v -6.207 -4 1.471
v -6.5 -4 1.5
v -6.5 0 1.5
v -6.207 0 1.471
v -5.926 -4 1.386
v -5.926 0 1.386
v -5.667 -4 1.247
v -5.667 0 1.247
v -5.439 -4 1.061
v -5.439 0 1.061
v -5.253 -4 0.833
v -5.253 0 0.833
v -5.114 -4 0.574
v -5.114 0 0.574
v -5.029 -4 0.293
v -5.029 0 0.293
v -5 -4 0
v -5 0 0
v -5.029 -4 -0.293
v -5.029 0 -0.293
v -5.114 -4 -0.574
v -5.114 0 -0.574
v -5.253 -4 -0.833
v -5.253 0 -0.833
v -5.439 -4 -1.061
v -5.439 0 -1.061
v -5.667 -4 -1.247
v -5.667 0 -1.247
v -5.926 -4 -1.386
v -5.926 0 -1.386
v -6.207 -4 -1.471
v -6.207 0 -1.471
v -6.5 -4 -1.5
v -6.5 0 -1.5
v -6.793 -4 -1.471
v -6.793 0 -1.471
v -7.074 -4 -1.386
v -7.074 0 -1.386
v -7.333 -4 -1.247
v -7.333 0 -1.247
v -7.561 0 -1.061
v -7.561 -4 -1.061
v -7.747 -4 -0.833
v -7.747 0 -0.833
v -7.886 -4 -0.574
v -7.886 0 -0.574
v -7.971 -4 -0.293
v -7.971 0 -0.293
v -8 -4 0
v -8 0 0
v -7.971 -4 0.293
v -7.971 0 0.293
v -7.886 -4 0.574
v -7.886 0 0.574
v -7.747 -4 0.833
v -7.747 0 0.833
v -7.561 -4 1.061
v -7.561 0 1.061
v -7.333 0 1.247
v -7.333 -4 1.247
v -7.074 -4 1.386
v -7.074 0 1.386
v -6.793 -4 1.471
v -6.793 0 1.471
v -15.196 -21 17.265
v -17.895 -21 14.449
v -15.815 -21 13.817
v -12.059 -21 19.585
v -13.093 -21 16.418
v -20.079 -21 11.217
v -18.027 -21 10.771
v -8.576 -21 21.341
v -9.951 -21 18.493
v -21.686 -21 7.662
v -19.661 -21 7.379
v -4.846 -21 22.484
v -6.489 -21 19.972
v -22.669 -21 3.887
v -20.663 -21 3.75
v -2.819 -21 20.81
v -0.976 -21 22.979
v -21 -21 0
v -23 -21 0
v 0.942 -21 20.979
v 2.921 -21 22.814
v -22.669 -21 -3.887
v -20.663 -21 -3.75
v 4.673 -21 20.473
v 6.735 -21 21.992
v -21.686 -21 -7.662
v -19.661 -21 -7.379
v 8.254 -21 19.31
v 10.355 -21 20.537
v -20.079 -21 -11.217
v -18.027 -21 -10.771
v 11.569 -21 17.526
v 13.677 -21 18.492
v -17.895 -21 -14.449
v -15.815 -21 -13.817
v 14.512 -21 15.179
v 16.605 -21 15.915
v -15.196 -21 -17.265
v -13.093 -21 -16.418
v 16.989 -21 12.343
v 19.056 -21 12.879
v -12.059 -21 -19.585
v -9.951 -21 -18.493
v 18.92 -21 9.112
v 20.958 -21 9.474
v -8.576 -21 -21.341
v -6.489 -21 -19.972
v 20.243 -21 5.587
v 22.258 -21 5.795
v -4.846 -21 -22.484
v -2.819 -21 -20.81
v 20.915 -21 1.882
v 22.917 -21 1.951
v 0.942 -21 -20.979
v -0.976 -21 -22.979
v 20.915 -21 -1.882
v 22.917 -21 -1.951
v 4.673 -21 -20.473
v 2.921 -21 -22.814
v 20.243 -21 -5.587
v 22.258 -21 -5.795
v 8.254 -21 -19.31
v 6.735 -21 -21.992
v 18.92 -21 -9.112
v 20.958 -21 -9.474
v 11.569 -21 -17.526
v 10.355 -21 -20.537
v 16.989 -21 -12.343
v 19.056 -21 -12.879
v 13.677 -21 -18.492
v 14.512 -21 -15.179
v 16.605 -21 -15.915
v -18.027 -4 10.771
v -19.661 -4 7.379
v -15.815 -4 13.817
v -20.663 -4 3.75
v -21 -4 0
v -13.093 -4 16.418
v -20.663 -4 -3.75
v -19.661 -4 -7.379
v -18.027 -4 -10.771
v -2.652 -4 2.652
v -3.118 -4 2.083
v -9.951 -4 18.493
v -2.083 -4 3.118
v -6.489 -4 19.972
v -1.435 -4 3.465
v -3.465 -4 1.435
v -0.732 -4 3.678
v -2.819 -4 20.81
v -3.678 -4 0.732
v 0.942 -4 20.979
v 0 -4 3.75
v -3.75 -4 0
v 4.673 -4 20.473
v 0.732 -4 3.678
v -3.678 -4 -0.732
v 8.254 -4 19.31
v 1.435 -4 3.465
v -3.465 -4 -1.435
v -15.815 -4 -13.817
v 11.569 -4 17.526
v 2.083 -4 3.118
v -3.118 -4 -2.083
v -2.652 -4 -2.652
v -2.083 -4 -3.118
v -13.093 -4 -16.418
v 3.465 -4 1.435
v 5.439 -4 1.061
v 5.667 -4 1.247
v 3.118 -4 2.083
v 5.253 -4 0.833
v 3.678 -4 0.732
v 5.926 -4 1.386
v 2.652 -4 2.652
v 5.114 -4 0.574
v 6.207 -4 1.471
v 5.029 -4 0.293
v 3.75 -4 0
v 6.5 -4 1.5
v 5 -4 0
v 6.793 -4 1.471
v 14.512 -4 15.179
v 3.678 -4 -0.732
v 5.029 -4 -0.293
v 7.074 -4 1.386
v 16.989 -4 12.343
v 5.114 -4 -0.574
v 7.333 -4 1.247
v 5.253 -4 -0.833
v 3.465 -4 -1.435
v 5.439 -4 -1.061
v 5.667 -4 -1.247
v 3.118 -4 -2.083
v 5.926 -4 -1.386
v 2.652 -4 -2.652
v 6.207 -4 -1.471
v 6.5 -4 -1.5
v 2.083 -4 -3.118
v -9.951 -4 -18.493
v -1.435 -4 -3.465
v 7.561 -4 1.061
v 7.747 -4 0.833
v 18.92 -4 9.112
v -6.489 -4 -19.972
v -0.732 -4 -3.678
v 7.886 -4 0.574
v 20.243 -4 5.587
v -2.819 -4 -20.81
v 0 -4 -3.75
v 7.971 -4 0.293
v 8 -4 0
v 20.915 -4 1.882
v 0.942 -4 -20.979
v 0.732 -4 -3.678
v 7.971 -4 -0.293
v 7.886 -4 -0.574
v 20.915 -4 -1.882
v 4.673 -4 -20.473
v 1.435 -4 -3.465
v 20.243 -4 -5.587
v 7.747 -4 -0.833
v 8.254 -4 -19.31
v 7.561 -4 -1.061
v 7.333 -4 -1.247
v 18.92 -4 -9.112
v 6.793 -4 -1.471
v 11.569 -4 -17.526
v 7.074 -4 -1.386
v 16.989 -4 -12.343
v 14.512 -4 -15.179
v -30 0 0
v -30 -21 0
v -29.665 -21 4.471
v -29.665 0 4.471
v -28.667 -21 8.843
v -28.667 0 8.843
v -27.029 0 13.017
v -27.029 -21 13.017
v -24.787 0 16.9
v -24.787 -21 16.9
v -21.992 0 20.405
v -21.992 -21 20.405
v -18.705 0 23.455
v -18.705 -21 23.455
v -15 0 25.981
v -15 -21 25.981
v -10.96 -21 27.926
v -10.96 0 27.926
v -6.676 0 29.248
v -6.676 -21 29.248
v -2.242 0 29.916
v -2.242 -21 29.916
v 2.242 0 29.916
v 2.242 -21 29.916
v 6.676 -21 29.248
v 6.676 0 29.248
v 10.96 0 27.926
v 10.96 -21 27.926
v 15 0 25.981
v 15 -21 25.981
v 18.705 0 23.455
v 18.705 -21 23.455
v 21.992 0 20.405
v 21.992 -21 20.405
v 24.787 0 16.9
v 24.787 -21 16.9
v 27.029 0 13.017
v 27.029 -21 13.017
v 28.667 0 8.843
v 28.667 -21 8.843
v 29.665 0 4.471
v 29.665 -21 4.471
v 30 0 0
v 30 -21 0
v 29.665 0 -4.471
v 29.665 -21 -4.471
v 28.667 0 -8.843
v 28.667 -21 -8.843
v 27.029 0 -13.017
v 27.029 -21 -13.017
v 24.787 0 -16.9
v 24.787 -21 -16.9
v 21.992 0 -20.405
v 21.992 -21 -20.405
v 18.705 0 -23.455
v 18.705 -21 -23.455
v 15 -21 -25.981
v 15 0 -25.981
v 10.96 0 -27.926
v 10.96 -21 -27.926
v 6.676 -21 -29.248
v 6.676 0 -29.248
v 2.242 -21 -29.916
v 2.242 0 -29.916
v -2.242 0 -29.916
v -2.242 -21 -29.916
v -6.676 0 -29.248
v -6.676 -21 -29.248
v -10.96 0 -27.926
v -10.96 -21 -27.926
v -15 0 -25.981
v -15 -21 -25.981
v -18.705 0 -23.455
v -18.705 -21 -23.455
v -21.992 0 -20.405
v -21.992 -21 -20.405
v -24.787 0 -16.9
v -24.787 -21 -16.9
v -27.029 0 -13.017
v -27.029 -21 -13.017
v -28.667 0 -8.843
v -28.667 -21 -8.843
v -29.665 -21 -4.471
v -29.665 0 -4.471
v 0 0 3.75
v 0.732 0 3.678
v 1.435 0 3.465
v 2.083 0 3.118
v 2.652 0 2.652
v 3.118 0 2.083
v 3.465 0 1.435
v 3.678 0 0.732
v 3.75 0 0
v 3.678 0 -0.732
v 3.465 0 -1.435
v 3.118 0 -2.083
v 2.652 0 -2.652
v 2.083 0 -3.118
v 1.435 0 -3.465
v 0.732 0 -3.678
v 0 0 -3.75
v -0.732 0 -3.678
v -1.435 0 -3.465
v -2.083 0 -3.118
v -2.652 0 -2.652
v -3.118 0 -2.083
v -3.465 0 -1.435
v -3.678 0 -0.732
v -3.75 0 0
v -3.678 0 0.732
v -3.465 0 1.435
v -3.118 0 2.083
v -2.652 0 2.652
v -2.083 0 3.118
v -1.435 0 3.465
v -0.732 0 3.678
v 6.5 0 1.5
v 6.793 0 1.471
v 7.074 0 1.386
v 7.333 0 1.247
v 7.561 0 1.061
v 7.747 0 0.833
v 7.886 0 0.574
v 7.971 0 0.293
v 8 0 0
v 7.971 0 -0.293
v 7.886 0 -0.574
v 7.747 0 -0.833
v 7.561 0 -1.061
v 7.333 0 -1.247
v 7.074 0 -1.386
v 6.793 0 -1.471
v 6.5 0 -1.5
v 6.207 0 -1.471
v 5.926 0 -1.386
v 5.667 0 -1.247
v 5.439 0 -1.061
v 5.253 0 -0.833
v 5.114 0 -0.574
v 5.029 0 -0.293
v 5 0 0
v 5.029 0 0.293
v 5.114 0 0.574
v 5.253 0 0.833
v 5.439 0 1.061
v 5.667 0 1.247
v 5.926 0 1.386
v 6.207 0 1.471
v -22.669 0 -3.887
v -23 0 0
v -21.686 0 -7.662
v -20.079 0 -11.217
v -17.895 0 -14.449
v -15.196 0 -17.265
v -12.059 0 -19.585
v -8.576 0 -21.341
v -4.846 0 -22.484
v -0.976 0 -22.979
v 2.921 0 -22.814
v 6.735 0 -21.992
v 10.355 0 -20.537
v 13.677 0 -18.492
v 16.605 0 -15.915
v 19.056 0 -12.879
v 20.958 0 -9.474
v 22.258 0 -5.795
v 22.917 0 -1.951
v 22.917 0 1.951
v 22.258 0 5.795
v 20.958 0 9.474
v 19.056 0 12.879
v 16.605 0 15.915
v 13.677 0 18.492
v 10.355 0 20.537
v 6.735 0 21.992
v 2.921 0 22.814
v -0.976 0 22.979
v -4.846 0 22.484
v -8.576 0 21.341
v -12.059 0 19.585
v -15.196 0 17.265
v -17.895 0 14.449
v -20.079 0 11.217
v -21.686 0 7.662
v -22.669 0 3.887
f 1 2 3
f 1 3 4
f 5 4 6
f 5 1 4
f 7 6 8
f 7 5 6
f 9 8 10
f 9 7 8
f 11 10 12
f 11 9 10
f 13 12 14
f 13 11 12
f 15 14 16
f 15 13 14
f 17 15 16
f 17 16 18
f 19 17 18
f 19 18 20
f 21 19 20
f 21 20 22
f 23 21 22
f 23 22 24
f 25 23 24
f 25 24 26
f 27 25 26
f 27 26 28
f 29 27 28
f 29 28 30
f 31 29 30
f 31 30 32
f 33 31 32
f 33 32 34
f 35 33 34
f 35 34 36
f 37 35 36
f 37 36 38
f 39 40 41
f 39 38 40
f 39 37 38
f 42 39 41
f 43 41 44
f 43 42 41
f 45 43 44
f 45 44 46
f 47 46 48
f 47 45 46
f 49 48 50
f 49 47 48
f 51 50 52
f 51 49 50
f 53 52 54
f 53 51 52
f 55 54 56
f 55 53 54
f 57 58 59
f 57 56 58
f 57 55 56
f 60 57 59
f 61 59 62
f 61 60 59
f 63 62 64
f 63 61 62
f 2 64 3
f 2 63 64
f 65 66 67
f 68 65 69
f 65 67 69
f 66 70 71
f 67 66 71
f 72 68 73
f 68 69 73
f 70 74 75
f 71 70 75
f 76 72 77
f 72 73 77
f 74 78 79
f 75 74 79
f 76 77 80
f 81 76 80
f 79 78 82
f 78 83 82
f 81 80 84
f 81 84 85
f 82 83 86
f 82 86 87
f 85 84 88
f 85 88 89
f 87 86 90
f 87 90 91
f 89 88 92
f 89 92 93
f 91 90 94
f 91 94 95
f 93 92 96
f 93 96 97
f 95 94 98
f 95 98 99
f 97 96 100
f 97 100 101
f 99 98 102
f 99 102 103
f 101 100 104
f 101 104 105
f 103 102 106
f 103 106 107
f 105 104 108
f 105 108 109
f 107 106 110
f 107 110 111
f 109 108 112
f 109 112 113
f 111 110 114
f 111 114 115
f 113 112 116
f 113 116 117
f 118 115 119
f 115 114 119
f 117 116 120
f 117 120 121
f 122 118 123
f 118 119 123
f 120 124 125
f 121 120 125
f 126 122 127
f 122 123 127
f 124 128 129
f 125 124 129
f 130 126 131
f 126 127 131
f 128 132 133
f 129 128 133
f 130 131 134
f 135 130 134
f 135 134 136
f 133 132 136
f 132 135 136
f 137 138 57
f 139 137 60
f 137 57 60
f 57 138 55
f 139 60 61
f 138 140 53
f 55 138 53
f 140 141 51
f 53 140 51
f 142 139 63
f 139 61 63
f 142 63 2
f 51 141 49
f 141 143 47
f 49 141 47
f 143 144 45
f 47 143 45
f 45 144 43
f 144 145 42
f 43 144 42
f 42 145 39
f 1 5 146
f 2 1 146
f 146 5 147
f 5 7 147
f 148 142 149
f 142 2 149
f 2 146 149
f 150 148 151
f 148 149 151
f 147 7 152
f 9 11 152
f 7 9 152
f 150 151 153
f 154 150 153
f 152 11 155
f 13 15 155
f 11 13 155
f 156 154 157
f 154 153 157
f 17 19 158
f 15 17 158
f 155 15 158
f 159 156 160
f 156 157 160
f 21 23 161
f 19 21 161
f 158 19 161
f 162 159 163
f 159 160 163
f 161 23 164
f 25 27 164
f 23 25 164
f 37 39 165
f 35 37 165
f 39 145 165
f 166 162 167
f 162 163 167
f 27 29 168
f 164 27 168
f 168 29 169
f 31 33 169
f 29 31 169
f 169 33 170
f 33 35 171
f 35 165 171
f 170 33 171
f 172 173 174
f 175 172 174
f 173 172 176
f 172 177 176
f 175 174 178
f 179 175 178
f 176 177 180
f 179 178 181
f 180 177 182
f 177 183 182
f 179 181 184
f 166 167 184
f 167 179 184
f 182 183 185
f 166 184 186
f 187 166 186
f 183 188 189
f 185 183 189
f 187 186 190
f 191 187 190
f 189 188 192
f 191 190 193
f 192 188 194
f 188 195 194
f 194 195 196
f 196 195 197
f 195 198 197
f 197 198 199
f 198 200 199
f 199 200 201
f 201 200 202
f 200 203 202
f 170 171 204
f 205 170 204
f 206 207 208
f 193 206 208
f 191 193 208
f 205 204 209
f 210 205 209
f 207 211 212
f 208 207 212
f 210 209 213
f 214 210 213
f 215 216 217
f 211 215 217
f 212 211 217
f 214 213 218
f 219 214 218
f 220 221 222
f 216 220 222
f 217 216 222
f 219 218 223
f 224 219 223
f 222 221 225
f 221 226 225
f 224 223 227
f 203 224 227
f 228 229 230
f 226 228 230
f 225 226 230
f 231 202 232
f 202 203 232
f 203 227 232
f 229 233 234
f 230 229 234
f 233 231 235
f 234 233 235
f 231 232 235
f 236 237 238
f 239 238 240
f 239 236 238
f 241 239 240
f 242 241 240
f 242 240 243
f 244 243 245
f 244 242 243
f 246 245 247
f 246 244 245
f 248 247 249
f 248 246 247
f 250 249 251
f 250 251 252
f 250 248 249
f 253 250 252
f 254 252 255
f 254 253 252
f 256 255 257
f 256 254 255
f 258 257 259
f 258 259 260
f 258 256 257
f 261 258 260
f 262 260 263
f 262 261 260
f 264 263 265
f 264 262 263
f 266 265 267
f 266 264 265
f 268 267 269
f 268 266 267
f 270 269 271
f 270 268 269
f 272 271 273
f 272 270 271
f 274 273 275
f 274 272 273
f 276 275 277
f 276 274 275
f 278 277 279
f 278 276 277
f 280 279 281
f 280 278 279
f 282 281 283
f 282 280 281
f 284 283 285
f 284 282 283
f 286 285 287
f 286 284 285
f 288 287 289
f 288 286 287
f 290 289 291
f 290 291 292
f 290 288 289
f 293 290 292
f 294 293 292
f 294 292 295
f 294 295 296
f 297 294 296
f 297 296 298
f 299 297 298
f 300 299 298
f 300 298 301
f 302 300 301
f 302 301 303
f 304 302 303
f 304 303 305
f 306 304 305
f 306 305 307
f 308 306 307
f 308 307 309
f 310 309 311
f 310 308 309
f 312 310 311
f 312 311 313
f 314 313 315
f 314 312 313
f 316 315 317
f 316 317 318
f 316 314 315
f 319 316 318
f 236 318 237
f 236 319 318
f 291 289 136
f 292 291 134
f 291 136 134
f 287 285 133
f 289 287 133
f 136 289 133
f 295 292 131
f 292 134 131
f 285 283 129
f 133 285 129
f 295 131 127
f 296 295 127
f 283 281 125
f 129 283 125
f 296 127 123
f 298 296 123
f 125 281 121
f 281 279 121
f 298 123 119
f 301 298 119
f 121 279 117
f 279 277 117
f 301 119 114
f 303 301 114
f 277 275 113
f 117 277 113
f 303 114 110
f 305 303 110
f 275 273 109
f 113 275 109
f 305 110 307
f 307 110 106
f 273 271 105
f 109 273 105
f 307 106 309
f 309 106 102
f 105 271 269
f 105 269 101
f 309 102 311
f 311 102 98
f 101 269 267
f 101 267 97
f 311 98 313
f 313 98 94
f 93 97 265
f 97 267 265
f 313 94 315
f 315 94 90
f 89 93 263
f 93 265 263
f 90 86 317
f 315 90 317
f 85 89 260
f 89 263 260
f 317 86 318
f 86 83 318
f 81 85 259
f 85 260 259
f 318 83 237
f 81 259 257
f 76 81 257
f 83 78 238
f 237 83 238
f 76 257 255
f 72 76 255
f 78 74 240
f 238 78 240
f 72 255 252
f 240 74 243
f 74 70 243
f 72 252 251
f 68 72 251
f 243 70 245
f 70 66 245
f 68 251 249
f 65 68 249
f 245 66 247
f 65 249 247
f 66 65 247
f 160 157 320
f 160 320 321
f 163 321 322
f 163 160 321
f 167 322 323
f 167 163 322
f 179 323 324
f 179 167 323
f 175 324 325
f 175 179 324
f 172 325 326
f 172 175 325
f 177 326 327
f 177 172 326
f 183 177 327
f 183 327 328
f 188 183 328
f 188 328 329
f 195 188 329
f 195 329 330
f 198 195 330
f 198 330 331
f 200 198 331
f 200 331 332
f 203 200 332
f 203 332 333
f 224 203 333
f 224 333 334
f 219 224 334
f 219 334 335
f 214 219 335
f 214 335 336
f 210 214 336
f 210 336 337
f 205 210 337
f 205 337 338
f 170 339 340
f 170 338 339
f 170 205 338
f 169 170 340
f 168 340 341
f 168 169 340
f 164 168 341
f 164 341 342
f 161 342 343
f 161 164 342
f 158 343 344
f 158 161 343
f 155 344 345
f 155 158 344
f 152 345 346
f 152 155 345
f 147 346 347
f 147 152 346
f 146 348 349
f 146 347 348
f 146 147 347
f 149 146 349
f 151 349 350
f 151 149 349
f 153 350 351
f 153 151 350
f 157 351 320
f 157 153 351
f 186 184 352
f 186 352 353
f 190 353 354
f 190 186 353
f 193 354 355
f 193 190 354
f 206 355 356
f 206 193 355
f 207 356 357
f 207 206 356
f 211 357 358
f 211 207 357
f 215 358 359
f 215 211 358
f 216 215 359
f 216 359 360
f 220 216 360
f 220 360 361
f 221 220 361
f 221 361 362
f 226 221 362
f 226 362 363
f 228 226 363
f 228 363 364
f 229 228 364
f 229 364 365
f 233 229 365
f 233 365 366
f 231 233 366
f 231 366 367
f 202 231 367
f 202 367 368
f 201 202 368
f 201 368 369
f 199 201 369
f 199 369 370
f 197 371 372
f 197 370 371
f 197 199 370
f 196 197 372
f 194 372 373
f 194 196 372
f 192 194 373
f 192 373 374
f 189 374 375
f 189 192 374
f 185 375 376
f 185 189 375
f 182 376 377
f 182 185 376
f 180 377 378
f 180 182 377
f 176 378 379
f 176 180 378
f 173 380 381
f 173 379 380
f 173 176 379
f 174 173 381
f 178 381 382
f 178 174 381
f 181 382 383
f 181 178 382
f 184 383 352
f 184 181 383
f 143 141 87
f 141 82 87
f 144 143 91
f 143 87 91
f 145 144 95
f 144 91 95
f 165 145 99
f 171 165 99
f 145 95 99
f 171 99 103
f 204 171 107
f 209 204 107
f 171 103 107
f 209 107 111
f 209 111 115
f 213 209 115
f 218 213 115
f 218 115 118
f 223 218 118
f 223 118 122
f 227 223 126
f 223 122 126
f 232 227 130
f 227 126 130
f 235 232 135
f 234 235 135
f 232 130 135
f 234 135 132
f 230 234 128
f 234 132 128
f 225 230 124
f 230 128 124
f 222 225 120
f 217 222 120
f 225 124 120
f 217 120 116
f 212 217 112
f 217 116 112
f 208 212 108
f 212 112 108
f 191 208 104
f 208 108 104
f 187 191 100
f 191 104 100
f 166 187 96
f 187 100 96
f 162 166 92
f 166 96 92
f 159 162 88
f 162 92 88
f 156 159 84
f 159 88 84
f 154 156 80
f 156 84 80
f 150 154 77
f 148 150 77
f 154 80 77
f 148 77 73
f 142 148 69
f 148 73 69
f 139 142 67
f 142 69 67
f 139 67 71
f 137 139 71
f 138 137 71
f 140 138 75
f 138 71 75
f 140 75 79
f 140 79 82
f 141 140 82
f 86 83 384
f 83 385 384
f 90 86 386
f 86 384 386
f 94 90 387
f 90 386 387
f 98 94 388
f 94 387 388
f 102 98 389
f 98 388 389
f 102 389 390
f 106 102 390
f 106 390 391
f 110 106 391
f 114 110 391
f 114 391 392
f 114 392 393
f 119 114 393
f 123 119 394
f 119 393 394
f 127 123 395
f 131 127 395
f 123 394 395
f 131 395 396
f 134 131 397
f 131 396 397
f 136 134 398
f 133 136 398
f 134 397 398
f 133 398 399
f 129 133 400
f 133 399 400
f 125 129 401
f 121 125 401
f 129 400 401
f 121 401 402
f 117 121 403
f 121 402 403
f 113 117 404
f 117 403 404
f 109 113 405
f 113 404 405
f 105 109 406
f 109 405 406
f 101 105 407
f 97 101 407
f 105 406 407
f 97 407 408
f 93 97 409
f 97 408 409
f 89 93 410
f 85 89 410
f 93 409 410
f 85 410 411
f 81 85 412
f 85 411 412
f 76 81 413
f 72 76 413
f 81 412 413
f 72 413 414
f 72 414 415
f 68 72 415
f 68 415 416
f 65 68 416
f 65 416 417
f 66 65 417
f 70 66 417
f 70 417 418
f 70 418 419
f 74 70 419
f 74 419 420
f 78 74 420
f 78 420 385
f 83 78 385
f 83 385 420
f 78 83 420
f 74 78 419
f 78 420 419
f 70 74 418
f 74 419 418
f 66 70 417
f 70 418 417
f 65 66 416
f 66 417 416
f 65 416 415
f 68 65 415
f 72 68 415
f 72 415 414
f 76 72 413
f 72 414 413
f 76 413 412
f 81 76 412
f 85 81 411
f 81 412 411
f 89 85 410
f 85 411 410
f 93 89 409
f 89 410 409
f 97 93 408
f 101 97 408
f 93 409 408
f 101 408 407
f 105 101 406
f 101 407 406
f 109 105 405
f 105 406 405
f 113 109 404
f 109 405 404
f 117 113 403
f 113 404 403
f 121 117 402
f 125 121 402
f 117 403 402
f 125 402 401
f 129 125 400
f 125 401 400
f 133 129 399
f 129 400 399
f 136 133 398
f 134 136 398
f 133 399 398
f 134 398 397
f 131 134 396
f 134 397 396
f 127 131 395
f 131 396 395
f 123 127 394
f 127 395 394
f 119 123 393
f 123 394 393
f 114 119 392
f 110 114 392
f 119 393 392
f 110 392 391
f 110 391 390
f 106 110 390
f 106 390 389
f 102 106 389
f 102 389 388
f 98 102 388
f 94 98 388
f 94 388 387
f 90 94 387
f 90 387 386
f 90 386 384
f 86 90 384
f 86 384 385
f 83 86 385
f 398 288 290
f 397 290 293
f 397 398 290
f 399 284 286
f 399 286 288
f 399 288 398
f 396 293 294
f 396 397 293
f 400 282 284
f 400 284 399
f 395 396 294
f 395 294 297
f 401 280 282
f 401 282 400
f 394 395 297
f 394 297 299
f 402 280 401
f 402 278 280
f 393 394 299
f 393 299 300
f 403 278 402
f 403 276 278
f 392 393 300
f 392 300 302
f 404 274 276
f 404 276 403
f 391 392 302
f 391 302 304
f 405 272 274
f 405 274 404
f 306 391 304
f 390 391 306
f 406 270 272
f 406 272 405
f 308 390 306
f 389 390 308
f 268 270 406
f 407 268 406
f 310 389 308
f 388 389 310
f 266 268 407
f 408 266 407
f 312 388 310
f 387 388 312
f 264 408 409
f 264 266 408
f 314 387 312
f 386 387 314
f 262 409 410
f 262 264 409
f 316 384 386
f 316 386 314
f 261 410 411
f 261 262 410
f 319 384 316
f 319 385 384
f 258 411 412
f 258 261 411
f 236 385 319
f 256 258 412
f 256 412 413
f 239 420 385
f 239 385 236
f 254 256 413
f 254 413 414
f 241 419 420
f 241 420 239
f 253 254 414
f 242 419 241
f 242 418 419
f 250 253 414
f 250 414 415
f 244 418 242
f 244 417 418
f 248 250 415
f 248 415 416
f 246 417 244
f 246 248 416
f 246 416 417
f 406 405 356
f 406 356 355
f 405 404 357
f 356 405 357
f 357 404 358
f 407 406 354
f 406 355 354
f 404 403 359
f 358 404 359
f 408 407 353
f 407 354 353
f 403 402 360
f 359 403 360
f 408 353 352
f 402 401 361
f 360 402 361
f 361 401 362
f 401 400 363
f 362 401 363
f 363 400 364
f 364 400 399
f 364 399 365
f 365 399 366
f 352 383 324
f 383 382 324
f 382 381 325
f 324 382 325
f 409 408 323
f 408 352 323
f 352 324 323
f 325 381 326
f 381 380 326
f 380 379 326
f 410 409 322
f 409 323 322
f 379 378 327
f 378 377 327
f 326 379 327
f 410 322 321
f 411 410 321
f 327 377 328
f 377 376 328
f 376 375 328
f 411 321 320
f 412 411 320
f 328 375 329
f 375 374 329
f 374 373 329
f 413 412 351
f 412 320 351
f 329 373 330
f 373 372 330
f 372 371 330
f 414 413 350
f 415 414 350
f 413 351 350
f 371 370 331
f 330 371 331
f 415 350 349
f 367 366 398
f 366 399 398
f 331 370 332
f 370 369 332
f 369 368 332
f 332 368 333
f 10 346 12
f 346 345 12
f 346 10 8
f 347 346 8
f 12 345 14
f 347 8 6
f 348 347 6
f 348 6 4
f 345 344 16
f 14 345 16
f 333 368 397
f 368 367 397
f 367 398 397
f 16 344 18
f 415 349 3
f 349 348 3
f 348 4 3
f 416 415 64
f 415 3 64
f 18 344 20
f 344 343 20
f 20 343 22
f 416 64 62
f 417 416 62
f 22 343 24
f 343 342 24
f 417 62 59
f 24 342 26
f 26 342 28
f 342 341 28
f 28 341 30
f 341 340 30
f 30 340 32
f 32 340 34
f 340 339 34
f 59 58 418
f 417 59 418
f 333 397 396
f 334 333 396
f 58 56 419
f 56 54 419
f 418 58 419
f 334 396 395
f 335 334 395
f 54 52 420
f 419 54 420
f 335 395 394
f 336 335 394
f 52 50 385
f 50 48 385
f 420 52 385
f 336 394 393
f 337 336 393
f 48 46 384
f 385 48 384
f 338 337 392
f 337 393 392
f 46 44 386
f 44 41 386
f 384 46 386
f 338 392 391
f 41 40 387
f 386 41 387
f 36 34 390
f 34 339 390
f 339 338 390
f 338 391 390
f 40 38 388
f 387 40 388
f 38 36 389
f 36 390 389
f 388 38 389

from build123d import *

# Parameters (mm, degrees)
CUT_EXTRUDE_1_DEPTH      = 39.716921365
CUT_EXTRUDE_1_DEPTH_BACK = 39.716921365
SKETCH_2_R               = 3.75
SKETCH_2_R_2             = 1.5
SKETCH_3_R               = 30
SKETCH_3_R_2             = 23
EXTRUDE_1_DEPTH          = 21


with BuildPart() as part:
    # 草图1 → 旋转1 (revolve)
    with BuildSketch(Plane.XY):
        Polygon((0, 0), (0, -4), (-21, -4), (-21, -21), (-23, -21), (-23, 0), align=None)
    revolve(axis=Axis((0, 0, 0), (0, -1, 0)))

    # 草图2 → 切除-拉伸1 (cut, two sides: drawn at the far end of the back side and taken through both)
    with BuildSketch(Plane(origin=(0, 0, 0), x_dir=(1, 0, 0), z_dir=(0, 1, 0)).offset(-CUT_EXTRUDE_1_DEPTH_BACK)):
        with Locations(Location((0, 0, 0), (0, 0, 270))):
            Circle(SKETCH_2_R)
        with Locations(Location((-6.5, 0, 0), (0, 0, 270))):
            Circle(SKETCH_2_R_2)
        with Locations(Location((6.5, 0, 0), (0, 0, 270))):
            Circle(SKETCH_2_R_2)
    extrude(amount=CUT_EXTRUDE_1_DEPTH + CUT_EXTRUDE_1_DEPTH_BACK, mode=Mode.SUBTRACT)


with BuildPart() as body_2:
    # 草图3 → 凸台-拉伸1 (new body)
    with BuildSketch(Plane(origin=(0, 0, 0), x_dir=(1, 0, 0), z_dir=(0, 1, 0))):
        with Locations(Location((0, 0, 0), (0, 0, 180))):
            Circle(SKETCH_3_R)
        with Locations(Location((0, 0, 0), (0, 0, 180))):
            Circle(SKETCH_3_R_2, mode=Mode.SUBTRACT)
    extrude(amount=-EXTRUDE_1_DEPTH)


solid = Compound([part.part, body_2.part])
